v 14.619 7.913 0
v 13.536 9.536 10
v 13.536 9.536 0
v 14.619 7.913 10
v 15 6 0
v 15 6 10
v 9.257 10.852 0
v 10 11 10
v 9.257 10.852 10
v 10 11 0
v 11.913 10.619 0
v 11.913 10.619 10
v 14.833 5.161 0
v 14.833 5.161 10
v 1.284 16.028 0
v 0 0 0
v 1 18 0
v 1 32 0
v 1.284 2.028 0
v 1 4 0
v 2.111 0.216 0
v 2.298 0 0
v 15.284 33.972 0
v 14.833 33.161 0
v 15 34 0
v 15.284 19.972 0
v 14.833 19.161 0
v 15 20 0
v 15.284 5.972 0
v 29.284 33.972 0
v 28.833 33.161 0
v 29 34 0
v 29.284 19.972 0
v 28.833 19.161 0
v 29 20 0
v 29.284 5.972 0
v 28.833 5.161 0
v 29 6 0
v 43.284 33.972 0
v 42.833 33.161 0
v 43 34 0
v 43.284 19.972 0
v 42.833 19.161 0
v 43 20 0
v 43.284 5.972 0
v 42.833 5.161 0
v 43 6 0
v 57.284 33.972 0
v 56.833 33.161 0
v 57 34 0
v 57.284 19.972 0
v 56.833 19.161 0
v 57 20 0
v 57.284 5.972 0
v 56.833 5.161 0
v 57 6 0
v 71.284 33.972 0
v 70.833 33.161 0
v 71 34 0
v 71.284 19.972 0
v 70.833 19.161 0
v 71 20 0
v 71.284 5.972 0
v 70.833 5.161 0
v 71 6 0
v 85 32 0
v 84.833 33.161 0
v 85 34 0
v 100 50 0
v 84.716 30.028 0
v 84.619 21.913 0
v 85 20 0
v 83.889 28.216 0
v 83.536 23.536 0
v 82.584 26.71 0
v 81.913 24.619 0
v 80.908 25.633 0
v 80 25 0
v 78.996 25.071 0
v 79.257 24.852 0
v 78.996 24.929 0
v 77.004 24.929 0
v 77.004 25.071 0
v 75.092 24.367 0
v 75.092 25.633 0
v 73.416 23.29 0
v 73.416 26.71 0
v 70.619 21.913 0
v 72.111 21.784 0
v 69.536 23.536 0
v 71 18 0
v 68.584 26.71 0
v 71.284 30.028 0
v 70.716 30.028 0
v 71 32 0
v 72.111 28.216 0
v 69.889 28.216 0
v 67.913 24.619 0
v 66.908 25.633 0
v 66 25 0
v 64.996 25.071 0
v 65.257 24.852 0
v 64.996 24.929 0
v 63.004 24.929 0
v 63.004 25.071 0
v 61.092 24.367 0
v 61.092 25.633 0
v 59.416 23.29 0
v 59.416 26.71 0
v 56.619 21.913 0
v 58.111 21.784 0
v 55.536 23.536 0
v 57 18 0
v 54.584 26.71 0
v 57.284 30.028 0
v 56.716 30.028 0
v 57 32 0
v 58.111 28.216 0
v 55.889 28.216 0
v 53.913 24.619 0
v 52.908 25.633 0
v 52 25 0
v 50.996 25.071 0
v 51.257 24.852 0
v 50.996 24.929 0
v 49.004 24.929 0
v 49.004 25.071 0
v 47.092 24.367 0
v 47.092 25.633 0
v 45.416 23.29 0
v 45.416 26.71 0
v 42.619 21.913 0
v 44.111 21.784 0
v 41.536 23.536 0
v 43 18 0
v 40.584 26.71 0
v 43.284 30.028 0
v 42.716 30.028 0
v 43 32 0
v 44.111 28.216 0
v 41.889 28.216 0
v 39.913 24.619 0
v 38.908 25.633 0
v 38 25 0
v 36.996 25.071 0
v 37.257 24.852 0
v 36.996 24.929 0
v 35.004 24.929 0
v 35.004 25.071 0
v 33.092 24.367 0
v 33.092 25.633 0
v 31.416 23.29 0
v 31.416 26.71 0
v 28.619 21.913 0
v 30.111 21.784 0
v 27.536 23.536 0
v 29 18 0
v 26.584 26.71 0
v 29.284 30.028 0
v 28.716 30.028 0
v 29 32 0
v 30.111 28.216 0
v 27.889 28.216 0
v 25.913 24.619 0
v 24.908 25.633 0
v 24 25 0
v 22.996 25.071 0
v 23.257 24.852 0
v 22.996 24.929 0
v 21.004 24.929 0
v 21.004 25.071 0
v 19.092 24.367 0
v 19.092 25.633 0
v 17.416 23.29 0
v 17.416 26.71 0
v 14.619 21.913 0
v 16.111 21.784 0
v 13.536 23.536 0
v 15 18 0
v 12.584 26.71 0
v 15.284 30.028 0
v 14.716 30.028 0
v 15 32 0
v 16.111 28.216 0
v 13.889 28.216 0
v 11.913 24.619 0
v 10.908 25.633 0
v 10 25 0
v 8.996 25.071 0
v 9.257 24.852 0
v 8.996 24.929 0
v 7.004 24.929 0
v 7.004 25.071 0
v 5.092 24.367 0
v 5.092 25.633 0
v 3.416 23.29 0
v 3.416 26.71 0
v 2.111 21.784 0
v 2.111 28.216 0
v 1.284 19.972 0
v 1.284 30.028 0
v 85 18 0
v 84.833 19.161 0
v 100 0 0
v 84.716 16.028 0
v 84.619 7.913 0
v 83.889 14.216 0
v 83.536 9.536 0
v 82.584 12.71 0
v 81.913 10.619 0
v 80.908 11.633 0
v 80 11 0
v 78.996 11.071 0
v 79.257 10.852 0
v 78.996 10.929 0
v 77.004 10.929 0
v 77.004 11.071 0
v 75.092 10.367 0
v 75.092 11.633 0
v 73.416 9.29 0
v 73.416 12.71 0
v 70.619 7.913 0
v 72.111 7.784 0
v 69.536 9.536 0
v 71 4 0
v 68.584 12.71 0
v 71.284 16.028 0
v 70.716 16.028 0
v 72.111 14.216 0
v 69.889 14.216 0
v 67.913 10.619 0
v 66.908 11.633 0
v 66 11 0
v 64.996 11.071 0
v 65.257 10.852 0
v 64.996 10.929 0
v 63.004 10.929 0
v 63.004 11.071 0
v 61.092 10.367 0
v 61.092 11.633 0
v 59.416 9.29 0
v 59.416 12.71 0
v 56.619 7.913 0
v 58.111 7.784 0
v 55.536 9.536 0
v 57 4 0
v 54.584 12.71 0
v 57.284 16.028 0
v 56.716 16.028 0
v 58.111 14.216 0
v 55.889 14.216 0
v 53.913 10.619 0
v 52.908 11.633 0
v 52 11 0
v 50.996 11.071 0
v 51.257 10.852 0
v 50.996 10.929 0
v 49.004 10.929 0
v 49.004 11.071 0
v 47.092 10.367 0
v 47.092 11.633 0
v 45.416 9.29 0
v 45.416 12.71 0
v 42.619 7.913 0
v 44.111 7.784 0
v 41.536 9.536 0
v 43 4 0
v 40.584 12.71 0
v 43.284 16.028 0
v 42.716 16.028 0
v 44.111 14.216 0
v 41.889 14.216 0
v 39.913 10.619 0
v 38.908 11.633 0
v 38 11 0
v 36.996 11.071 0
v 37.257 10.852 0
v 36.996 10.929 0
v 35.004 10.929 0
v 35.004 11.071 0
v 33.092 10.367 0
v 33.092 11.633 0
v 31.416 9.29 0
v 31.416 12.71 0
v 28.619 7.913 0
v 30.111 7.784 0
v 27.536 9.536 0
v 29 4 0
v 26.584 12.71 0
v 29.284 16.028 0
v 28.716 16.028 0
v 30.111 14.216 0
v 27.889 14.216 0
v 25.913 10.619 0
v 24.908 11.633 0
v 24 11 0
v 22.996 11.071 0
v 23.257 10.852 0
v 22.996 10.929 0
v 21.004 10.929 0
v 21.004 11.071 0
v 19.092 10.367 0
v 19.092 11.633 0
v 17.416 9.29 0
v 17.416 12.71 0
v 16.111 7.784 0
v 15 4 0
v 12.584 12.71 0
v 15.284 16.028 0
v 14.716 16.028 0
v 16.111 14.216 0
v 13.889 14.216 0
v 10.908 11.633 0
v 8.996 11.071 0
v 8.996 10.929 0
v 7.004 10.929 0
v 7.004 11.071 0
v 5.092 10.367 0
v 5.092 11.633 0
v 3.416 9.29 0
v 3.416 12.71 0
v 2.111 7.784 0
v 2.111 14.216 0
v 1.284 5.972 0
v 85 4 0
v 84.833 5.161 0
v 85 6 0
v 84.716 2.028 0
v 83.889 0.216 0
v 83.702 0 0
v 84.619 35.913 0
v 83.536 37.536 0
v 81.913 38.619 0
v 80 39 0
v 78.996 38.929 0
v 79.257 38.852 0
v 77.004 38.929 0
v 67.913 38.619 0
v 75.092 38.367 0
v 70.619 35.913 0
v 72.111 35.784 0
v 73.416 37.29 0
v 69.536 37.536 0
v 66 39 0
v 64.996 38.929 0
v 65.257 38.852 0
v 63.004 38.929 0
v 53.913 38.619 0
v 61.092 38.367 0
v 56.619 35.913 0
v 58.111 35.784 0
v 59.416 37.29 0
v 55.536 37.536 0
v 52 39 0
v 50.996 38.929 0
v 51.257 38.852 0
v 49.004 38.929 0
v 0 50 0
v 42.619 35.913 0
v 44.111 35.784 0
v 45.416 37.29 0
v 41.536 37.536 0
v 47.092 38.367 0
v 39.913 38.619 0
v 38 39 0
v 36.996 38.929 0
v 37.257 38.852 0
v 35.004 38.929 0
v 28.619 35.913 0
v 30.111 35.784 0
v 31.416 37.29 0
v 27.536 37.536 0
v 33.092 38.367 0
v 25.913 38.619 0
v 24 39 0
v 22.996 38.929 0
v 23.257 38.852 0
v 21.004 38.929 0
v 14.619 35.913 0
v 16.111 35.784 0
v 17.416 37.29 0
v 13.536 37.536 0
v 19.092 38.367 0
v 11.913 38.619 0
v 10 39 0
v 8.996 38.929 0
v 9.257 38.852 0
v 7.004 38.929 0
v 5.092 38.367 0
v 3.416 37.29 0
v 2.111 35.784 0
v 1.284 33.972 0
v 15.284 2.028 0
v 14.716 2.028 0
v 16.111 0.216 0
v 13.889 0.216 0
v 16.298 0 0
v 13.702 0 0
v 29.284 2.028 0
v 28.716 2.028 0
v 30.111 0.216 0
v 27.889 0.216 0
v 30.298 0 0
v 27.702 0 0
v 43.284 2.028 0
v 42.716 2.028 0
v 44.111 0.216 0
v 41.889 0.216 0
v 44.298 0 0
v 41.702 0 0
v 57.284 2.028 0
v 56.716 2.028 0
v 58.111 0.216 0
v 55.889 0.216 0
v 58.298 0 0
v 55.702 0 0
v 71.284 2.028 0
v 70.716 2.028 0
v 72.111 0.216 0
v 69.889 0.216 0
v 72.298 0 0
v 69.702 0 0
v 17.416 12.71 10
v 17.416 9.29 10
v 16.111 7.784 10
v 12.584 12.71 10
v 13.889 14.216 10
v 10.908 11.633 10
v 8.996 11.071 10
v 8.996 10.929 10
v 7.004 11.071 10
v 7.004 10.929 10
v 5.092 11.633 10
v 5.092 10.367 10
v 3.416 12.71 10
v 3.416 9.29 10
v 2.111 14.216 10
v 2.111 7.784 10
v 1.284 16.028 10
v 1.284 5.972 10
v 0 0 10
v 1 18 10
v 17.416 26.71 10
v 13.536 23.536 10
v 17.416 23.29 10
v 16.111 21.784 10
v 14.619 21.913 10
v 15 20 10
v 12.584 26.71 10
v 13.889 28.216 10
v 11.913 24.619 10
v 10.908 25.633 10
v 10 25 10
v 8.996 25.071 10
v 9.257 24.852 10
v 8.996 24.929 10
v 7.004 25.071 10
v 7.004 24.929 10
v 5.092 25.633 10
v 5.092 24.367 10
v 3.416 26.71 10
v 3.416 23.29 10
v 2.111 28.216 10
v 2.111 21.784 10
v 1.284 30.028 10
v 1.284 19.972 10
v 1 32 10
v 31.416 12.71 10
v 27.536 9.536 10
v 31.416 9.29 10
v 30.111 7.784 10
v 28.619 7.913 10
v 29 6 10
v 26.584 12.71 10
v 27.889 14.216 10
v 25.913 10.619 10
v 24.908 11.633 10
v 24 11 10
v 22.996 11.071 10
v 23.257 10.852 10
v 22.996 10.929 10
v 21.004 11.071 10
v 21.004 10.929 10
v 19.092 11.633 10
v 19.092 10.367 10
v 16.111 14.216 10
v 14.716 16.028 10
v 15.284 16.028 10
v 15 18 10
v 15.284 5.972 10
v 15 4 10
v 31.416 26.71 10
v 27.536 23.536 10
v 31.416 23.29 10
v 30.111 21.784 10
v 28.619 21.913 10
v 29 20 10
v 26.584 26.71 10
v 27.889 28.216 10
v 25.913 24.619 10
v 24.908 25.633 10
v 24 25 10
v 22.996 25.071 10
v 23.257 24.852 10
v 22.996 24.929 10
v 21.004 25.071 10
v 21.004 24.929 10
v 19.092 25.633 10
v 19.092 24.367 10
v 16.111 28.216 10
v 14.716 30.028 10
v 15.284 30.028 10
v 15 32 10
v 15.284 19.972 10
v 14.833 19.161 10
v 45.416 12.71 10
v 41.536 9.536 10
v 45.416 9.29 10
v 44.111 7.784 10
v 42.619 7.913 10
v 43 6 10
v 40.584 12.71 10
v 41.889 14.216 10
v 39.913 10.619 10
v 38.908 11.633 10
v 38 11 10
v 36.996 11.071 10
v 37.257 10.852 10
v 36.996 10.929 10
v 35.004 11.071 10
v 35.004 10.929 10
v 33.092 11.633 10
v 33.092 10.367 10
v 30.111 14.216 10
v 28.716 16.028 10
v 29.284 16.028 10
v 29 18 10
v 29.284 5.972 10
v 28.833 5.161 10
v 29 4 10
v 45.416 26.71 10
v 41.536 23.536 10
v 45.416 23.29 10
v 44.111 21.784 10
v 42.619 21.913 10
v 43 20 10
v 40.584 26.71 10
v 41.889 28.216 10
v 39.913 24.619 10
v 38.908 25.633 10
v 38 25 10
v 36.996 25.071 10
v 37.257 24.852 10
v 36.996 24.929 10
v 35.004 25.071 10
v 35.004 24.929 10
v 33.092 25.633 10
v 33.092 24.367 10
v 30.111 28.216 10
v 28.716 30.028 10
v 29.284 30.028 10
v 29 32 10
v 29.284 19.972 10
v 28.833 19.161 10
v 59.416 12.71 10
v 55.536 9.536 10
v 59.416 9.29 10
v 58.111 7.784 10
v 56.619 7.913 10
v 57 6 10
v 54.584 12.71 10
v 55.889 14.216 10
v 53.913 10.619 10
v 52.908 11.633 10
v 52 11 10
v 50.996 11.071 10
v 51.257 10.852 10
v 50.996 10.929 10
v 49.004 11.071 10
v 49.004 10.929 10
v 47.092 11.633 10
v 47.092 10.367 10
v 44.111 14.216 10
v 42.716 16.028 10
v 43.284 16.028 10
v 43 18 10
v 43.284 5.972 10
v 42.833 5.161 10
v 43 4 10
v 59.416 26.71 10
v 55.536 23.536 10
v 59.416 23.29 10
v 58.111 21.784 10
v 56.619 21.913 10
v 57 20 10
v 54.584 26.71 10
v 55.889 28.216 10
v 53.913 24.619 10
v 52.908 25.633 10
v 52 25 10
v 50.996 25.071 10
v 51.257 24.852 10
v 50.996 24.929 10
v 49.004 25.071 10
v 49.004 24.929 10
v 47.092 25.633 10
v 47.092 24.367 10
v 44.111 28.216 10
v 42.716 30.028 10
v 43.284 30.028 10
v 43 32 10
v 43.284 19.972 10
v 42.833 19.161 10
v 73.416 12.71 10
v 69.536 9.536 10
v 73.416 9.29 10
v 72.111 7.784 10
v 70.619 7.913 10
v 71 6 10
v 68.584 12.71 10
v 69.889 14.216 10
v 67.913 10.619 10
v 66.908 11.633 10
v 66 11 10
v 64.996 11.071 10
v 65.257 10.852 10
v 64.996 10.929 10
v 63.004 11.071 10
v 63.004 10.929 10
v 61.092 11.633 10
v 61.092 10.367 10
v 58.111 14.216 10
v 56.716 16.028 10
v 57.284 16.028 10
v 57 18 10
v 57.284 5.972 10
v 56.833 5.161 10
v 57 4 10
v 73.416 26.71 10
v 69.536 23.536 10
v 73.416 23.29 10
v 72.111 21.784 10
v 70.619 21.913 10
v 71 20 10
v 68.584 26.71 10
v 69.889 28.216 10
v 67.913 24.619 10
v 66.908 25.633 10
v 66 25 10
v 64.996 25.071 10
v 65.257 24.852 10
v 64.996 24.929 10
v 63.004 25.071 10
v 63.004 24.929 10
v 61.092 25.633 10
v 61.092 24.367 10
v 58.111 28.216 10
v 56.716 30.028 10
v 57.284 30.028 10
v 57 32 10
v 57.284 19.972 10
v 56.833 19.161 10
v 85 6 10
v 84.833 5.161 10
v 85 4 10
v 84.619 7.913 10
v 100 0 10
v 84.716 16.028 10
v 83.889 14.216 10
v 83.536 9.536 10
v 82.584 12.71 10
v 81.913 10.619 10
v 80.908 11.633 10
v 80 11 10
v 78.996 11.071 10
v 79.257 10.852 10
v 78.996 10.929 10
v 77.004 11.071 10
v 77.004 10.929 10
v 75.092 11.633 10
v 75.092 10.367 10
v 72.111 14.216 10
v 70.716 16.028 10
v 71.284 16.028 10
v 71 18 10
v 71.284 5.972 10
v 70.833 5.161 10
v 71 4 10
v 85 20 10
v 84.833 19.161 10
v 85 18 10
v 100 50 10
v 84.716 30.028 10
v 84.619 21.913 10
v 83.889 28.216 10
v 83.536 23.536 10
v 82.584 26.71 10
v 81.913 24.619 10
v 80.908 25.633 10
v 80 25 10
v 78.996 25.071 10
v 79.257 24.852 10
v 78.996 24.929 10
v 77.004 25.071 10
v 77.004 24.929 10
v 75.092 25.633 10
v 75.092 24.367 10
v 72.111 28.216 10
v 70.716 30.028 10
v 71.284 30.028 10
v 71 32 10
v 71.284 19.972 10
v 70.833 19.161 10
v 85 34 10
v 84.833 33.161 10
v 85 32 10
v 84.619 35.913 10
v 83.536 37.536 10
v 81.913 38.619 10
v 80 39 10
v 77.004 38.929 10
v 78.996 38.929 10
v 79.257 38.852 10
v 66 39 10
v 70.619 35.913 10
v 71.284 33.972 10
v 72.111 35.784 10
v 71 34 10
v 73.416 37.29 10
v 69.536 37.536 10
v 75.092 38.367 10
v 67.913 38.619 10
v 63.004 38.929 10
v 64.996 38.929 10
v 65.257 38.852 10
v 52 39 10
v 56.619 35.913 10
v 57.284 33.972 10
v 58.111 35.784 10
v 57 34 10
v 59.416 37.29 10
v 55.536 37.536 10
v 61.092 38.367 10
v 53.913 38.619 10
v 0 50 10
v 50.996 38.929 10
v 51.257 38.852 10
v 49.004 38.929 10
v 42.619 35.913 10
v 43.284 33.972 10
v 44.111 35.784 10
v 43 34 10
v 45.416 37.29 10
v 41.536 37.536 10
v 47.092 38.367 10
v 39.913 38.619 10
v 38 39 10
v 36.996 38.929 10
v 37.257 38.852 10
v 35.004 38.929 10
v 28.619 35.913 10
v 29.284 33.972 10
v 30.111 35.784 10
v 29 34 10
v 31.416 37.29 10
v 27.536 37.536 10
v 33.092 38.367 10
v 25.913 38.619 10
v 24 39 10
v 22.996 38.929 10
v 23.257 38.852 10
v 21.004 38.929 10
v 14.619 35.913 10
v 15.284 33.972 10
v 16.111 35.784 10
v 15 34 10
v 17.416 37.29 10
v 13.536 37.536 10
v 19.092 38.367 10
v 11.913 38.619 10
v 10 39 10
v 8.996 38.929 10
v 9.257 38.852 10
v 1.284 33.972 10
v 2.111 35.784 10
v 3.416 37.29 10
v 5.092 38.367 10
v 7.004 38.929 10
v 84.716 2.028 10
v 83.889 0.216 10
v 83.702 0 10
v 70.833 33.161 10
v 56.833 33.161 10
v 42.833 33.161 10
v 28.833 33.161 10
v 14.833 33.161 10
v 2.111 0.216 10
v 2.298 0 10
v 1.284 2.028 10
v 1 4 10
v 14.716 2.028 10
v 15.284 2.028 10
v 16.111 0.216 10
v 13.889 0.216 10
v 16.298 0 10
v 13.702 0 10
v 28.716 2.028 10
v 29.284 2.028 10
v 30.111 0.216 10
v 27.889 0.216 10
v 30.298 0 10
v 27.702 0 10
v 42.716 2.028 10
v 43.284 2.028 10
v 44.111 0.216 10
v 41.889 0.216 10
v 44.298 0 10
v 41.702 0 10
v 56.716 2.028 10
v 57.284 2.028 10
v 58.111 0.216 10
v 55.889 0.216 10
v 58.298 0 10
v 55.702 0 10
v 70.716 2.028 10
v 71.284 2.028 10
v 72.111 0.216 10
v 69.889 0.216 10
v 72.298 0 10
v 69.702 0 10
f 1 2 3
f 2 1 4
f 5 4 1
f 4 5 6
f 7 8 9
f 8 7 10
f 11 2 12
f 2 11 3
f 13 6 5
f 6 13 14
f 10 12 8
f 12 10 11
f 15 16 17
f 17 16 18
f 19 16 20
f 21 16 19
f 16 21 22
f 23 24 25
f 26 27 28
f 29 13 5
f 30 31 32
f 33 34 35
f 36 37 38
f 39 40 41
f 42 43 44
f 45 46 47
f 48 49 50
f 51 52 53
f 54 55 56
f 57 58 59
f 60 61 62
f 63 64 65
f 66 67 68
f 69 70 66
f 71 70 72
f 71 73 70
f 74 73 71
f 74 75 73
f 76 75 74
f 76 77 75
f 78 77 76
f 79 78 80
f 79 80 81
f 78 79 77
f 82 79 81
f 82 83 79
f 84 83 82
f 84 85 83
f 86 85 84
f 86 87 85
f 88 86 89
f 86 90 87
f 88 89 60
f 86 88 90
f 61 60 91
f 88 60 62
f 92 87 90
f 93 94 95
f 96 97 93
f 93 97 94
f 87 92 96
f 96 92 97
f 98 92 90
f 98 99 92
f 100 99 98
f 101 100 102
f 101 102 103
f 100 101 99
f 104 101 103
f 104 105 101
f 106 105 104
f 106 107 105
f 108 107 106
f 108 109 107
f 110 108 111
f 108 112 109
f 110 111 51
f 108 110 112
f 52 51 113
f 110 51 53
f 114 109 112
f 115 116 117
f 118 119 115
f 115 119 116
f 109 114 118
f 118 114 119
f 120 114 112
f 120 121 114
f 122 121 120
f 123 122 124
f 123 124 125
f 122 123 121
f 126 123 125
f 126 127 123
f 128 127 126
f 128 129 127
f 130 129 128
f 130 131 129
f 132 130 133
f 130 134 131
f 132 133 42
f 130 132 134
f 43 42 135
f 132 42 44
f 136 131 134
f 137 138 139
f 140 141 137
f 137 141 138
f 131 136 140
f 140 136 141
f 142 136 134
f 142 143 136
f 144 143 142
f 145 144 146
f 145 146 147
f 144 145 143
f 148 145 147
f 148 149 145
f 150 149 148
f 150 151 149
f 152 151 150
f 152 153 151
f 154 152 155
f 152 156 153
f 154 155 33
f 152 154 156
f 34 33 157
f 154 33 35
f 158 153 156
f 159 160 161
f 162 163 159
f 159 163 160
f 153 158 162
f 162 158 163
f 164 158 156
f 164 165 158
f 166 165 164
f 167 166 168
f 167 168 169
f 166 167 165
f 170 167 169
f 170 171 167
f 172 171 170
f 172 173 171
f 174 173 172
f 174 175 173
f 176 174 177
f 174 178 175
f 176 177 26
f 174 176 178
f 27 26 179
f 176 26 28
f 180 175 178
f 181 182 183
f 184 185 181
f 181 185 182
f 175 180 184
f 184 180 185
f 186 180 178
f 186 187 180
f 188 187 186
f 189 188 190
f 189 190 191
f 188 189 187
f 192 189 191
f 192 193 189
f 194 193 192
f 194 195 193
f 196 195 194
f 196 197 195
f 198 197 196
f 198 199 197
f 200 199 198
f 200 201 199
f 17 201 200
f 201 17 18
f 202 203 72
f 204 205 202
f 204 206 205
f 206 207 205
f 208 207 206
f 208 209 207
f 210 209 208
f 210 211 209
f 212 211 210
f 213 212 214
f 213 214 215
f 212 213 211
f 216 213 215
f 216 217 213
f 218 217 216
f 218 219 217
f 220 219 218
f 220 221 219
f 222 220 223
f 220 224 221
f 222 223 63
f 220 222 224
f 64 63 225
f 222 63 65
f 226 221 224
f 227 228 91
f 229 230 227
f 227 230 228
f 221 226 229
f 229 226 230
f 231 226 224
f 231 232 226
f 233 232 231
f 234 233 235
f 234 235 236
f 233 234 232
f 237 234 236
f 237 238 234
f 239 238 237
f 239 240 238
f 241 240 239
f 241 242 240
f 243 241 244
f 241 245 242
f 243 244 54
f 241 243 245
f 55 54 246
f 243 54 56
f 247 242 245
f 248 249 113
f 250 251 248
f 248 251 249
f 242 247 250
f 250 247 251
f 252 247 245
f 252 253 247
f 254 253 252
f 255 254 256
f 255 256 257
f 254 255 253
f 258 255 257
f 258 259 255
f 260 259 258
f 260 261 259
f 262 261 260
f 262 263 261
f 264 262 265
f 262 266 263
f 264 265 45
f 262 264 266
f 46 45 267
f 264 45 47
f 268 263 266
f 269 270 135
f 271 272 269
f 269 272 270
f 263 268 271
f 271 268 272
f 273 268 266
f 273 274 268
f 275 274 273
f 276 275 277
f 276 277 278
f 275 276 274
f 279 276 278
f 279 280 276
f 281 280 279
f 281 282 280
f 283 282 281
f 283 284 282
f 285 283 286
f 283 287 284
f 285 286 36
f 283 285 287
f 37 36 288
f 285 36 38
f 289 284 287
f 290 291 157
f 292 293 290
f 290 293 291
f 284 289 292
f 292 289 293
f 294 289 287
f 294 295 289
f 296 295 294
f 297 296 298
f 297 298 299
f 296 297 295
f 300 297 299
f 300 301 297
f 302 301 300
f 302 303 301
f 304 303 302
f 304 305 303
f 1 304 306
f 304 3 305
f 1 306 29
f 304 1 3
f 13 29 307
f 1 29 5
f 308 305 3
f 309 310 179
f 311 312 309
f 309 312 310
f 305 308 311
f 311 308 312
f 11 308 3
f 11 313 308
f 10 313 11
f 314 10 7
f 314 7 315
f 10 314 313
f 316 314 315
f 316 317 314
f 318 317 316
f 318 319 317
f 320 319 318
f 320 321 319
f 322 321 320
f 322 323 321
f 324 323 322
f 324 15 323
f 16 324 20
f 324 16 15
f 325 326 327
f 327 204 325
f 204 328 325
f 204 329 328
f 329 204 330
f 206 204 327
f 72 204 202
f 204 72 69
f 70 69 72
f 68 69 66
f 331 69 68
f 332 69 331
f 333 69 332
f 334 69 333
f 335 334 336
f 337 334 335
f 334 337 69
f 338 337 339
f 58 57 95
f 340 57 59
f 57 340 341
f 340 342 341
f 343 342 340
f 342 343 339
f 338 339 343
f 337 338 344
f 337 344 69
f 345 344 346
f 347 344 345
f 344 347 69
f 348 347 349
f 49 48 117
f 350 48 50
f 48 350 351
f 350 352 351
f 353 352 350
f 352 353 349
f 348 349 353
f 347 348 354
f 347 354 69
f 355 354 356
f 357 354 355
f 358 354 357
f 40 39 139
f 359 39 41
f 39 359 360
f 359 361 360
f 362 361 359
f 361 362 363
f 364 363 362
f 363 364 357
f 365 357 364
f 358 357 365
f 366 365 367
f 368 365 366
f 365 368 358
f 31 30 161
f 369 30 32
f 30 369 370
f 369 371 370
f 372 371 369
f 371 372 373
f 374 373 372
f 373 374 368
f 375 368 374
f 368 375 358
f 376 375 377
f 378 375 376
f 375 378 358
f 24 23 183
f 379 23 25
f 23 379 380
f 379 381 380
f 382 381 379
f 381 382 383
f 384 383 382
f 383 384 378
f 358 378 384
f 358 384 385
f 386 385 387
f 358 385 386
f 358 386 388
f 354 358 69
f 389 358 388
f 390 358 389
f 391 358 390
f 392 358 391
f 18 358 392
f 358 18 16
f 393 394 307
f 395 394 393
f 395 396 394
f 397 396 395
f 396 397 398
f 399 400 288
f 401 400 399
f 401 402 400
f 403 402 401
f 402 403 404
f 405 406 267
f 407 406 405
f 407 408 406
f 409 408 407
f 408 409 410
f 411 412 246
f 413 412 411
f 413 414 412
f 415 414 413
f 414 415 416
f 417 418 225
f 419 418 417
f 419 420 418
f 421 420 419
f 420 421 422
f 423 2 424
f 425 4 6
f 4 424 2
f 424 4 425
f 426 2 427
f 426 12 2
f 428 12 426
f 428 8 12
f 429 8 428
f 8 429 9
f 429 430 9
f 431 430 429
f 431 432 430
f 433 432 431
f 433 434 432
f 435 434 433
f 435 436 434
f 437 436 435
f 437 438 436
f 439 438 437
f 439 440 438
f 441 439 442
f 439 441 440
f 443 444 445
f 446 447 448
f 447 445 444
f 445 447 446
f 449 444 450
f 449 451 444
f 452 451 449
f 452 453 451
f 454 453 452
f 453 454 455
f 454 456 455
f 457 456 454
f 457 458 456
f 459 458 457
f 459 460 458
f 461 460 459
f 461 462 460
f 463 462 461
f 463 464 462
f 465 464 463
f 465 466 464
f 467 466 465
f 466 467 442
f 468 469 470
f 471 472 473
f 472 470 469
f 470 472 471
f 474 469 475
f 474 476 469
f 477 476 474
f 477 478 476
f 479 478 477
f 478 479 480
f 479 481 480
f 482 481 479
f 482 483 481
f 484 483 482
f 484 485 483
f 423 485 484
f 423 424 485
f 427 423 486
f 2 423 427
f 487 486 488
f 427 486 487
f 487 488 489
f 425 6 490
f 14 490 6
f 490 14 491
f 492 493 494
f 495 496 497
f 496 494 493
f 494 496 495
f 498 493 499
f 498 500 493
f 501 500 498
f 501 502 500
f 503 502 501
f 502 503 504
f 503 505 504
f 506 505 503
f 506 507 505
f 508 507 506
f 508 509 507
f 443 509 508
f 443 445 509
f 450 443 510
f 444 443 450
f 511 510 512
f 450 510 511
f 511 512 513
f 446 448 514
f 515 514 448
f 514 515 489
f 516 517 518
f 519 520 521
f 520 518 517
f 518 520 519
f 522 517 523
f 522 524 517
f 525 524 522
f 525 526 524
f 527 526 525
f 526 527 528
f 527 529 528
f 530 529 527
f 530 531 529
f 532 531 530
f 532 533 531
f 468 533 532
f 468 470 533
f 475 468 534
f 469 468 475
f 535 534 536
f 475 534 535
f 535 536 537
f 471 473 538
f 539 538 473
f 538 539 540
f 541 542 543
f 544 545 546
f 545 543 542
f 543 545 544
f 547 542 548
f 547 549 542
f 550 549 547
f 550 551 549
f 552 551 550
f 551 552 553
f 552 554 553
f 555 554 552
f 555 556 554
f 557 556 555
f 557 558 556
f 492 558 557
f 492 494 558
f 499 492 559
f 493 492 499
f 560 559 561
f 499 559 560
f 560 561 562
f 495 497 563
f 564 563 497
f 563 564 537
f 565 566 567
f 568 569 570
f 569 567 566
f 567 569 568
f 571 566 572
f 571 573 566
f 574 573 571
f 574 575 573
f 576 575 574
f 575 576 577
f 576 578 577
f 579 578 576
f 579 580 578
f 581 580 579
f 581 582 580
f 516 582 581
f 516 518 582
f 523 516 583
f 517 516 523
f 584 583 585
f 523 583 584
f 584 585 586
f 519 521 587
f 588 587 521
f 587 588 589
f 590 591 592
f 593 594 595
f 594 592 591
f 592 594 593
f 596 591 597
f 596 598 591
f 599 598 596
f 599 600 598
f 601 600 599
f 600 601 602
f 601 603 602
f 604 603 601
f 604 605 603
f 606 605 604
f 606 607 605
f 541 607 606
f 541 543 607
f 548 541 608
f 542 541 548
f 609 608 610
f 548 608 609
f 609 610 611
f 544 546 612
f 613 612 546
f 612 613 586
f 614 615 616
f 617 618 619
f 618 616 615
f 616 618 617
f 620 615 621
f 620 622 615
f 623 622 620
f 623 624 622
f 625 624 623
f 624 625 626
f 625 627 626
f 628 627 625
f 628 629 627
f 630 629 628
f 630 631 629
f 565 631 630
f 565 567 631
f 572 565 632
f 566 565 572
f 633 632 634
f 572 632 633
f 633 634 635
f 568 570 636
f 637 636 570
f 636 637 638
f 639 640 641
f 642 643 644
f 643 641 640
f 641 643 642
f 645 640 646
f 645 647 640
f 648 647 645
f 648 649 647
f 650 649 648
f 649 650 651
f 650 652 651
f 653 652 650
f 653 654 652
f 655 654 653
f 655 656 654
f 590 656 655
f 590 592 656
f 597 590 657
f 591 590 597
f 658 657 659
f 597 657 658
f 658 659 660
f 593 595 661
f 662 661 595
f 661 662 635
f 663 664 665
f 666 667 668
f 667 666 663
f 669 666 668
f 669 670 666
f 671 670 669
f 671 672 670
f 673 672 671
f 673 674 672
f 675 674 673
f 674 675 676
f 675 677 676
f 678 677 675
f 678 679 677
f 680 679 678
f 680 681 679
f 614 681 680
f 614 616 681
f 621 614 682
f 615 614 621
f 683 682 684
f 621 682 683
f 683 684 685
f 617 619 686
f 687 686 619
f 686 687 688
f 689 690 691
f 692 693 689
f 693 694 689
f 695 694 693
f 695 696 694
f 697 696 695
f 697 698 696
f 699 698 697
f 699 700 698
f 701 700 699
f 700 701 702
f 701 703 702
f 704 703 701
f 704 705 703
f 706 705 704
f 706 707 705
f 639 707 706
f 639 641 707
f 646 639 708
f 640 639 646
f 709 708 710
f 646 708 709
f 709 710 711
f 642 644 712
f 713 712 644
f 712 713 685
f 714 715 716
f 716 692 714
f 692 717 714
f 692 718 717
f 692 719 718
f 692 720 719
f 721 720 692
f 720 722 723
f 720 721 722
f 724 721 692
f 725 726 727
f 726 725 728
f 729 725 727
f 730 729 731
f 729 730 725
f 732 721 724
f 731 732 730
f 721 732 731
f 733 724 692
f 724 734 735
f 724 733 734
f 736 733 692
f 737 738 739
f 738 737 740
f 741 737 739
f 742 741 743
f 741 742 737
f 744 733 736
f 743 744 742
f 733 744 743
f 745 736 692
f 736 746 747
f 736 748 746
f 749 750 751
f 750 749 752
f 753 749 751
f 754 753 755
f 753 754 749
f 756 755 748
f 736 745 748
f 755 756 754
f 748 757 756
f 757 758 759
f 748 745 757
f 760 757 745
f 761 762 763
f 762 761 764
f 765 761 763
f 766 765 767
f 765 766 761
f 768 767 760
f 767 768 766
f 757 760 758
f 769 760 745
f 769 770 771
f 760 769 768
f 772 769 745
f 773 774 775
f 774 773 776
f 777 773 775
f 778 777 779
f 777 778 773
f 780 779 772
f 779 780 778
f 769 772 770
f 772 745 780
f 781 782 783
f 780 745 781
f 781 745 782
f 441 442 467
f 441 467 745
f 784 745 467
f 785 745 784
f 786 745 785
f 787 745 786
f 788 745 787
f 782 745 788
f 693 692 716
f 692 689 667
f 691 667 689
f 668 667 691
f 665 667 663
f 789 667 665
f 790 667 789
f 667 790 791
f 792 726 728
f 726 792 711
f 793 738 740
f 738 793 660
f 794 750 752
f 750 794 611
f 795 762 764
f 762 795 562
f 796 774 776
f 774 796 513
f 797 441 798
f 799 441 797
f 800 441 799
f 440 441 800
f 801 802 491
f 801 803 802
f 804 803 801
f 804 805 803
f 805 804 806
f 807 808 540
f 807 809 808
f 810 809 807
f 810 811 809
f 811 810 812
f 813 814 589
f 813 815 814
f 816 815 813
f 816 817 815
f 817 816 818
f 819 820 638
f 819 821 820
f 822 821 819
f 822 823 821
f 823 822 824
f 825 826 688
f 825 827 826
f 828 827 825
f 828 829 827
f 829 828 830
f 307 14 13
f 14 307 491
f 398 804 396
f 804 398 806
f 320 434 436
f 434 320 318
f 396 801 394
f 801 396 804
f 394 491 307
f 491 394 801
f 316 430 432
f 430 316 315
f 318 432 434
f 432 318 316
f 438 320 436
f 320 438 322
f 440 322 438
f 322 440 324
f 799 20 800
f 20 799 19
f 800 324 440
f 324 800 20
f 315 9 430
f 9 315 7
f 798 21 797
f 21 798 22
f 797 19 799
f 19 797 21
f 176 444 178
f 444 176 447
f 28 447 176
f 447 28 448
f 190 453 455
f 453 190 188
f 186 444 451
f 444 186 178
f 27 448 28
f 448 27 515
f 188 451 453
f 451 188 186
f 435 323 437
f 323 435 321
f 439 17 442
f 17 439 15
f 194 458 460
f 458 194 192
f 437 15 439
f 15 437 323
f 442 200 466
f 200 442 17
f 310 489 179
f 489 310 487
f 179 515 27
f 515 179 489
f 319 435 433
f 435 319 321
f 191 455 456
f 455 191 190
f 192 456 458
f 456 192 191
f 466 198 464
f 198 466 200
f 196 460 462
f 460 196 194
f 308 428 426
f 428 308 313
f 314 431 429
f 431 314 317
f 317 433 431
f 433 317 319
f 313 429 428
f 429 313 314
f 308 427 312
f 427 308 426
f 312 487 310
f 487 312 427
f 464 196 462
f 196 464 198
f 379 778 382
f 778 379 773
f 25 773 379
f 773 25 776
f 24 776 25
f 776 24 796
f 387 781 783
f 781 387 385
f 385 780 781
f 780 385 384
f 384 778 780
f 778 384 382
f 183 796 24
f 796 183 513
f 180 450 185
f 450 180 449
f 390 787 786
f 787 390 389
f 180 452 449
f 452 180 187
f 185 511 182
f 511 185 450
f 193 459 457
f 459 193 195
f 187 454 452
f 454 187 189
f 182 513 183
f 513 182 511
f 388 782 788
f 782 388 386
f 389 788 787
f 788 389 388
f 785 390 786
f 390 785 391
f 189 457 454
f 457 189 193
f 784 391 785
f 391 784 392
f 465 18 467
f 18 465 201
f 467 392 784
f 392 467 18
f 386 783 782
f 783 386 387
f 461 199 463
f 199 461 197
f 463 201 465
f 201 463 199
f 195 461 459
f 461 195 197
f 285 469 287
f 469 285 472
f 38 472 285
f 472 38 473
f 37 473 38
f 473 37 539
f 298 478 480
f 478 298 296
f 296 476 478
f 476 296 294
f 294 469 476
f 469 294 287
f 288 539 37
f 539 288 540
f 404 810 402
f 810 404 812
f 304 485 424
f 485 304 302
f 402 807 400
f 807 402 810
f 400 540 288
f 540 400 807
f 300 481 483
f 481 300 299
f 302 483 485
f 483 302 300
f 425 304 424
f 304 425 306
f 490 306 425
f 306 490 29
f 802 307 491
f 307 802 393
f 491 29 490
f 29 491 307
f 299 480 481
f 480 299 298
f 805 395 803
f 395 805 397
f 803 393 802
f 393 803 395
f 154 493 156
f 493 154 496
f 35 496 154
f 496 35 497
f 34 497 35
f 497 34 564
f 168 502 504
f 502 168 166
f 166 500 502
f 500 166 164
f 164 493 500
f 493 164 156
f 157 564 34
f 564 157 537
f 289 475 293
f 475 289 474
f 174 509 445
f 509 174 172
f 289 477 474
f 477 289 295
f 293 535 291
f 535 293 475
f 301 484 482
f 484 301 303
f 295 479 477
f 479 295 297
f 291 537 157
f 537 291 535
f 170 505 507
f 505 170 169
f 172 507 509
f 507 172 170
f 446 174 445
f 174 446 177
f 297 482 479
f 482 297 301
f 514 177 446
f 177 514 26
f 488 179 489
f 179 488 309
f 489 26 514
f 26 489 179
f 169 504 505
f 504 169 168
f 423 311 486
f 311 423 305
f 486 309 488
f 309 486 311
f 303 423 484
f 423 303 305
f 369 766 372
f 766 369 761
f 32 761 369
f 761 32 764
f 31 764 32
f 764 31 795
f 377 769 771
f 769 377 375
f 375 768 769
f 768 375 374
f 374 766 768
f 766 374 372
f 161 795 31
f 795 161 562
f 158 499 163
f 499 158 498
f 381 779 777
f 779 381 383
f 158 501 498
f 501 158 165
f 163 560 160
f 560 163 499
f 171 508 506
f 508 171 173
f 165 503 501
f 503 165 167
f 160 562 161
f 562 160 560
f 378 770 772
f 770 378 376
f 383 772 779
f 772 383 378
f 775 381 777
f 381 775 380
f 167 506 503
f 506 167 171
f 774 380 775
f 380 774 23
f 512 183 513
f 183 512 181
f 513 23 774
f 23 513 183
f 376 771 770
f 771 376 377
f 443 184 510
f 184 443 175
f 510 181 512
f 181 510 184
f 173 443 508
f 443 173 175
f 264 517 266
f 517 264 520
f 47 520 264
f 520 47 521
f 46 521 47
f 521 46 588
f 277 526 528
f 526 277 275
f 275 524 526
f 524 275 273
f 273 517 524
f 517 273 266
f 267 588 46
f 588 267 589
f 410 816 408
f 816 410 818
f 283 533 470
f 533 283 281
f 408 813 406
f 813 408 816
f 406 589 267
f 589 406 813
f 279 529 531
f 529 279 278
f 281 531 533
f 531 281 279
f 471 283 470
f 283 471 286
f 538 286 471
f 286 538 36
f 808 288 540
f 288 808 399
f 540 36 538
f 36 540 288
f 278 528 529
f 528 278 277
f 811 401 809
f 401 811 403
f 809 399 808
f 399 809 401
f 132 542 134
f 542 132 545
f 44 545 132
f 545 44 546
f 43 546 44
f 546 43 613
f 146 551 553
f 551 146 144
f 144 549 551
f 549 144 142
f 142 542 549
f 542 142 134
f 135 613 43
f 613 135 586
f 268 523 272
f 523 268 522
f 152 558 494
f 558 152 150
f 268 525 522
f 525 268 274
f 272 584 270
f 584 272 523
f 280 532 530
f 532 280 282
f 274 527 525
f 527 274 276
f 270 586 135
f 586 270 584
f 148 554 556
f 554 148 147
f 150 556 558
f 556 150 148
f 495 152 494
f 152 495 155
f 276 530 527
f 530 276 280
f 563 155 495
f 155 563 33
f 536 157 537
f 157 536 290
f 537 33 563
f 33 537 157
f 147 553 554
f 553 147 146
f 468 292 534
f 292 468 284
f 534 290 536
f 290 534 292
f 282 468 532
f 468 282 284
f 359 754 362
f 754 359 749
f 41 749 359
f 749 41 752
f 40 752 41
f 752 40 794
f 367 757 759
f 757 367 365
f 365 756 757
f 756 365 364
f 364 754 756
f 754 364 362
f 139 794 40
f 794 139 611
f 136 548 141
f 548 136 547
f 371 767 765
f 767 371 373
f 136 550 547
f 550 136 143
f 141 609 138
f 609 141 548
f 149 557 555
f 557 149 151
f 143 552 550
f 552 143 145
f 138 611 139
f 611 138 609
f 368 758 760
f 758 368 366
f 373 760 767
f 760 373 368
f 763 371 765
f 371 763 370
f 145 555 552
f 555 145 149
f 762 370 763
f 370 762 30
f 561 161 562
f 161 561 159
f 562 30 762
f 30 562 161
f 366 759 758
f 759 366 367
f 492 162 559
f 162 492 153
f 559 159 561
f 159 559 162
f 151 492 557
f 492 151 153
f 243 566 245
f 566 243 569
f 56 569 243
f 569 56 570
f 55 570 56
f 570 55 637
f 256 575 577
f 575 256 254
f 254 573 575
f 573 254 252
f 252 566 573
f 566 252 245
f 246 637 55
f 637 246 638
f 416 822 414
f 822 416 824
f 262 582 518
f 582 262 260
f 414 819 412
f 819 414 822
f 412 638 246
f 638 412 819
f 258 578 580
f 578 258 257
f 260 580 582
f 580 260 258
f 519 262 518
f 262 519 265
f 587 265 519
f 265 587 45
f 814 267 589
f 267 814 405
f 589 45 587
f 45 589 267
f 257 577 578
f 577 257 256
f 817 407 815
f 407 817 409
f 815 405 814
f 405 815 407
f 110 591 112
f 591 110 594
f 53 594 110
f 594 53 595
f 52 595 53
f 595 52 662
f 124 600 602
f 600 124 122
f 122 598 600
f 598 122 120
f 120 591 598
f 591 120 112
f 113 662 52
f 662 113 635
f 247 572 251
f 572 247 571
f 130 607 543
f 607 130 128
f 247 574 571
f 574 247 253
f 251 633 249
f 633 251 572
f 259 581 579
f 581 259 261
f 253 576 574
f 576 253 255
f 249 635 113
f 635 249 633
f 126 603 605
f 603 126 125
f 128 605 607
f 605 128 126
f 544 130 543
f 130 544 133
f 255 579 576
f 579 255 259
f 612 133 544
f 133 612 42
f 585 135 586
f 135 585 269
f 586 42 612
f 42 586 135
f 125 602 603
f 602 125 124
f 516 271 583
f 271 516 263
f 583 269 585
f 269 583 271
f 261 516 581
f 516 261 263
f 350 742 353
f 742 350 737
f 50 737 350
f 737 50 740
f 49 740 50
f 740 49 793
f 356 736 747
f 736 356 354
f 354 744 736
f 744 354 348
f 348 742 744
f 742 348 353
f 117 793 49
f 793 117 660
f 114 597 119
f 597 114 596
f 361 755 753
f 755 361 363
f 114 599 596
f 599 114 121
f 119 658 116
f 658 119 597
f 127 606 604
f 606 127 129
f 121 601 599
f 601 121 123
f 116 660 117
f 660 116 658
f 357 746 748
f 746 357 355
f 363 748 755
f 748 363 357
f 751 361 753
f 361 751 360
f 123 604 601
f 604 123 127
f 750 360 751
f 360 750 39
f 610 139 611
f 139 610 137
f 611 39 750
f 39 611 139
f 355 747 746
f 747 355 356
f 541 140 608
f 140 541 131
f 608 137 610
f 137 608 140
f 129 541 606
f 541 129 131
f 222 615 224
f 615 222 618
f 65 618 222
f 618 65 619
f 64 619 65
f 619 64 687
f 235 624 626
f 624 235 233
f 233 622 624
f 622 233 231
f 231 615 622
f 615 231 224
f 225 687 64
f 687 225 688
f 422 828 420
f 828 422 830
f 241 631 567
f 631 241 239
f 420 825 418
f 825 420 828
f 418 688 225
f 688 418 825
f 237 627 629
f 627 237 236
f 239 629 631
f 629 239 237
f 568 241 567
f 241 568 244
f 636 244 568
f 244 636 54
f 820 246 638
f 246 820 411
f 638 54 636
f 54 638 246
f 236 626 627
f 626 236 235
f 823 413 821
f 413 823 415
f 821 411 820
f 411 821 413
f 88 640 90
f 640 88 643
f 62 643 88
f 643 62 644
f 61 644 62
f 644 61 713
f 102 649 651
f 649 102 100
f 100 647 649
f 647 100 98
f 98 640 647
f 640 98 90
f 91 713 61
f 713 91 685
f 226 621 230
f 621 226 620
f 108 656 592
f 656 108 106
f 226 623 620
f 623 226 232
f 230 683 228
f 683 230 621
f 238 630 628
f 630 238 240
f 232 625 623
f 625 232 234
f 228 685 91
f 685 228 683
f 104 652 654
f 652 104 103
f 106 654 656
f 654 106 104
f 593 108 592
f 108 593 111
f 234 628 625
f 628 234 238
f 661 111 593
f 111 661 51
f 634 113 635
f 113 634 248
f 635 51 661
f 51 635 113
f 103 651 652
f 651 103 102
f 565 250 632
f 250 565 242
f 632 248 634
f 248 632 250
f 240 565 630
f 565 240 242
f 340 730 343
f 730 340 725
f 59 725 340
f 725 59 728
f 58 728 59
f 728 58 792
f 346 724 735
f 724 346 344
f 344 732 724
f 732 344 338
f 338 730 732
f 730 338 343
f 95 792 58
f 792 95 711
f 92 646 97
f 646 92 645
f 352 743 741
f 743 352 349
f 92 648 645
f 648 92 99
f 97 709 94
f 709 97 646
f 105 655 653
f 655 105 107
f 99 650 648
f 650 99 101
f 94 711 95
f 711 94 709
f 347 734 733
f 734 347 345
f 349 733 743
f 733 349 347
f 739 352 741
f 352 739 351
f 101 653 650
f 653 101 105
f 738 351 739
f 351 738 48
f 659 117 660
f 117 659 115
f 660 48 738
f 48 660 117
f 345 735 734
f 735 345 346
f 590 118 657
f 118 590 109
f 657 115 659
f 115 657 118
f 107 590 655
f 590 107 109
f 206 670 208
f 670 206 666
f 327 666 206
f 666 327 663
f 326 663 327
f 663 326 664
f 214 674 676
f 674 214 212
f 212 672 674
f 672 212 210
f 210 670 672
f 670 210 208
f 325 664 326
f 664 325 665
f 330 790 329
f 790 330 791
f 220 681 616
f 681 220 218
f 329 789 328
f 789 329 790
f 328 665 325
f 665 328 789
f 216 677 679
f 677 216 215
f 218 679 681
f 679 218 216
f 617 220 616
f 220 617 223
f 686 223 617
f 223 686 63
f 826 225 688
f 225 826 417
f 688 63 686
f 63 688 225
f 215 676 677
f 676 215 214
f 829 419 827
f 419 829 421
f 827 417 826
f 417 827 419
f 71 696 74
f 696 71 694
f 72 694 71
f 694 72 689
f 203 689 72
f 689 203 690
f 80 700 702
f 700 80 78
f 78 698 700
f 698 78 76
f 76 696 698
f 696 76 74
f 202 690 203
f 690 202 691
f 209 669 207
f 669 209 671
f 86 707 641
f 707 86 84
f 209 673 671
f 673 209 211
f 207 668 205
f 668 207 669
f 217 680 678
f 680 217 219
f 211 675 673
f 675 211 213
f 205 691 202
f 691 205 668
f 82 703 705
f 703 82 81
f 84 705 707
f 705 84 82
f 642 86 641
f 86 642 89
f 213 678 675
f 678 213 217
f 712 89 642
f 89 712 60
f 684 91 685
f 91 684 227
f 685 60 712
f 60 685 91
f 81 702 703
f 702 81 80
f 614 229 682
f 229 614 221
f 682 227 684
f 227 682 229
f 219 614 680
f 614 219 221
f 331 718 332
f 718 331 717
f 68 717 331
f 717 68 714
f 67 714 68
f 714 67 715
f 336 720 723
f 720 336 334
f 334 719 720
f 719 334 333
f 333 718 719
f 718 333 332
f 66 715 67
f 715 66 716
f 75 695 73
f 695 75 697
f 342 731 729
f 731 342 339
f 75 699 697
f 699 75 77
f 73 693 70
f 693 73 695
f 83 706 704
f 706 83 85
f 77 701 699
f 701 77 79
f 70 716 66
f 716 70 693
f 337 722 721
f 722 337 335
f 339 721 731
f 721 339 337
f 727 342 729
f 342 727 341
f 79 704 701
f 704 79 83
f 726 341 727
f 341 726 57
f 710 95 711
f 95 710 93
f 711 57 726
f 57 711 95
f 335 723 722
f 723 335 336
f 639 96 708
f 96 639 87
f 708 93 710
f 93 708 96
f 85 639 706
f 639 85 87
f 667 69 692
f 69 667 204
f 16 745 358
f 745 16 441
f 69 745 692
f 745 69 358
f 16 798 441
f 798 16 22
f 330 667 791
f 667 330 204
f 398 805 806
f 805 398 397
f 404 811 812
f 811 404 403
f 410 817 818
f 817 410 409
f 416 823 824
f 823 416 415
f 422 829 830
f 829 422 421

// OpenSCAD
module distribute_cylinders_with_rim(cube_size=[100, 50, 10], cylinder_diameter=10, cylinder_height=10, spacing=4, rim_width=2, rim_height=1) {
    // Berechnung der Anzahl der Zylinder in X- und Y-Richtung
    cols = floor((cube_size[0] - spacing) / (cylinder_diameter + spacing));
    rows = floor((cube_size[1] - spacing) / (cylinder_diameter + spacing));
    
    // Berechnung des Abstands vom Rand
    x_margin = (cube_size[0] - (cols * (cylinder_diameter + spacing) - spacing)) / 2;
    y_margin = (cube_size[1] - (rows * (cylinder_diameter + spacing) - spacing)) / 2;
    
    // Erstellen des Cubes
    difference() {
        cube([cube_size[0], cube_size[1], cube_size[2]]);
        
        // Platzieren der Zylinder und Ränder
        for (x = [0:cols-1]) {
            for (y = [0:rows-1]) {
                translate([x_margin + x * (cylinder_diameter + spacing), y_margin + y * (cylinder_diameter + spacing), 0]) {
                    // Zylinderloch
                    cylinder(h=cube_size[2], d=cylinder_diameter);
                    
                    // Rand um das Loch
                    translate([-rim_width, -rim_width, -rim_height])
                        cylinder(h=cube_size[2] + rim_height, d=cylinder_diameter + 2 * rim_width);
                }
            }
        }
    }
}

// Beispielaufruf der Funktion
distribute_cylinders_with_rim([100, 50, 10], 10, 10, 4, 2, 1);
